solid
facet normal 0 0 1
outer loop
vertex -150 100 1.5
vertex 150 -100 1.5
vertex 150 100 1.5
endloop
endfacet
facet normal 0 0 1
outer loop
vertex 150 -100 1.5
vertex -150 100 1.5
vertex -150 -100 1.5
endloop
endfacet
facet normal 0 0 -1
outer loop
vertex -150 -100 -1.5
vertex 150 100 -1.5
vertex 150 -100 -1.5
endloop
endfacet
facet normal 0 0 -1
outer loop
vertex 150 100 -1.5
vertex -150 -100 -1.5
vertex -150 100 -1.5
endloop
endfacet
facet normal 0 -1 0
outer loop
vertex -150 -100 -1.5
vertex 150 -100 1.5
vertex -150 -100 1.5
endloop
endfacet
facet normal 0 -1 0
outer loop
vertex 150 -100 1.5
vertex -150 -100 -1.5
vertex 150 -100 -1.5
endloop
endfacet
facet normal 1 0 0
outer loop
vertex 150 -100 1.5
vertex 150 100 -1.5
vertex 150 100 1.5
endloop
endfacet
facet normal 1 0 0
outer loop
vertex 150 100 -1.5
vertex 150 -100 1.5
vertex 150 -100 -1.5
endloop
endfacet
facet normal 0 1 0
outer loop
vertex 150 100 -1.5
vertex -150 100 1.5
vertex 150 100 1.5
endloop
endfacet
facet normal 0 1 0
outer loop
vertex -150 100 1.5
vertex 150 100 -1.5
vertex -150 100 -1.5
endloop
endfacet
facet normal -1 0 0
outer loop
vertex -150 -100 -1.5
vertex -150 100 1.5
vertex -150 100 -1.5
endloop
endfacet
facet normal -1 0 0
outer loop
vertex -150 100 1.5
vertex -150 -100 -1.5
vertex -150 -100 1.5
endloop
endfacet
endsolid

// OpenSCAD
// Sheet mild steel (single connected solid)

// Parameters
sheet_length = 300;      //[150:600:1]
sheet_width  = 200;      //[100:400:1]
sheet_thickness = 3;     //[1.5:6:0.5]

// Robustness (avoid blank/near-zero thickness renders)
min_th = 0.5;
t = max(sheet_thickness, min_th);

// Geometry (one connected solid)
module sheet_plate() {
    color([0.35, 0.35, 0.35])
        cube([sheet_length, sheet_width, t], center=true);
}

// Final Output
sheet_plate();
